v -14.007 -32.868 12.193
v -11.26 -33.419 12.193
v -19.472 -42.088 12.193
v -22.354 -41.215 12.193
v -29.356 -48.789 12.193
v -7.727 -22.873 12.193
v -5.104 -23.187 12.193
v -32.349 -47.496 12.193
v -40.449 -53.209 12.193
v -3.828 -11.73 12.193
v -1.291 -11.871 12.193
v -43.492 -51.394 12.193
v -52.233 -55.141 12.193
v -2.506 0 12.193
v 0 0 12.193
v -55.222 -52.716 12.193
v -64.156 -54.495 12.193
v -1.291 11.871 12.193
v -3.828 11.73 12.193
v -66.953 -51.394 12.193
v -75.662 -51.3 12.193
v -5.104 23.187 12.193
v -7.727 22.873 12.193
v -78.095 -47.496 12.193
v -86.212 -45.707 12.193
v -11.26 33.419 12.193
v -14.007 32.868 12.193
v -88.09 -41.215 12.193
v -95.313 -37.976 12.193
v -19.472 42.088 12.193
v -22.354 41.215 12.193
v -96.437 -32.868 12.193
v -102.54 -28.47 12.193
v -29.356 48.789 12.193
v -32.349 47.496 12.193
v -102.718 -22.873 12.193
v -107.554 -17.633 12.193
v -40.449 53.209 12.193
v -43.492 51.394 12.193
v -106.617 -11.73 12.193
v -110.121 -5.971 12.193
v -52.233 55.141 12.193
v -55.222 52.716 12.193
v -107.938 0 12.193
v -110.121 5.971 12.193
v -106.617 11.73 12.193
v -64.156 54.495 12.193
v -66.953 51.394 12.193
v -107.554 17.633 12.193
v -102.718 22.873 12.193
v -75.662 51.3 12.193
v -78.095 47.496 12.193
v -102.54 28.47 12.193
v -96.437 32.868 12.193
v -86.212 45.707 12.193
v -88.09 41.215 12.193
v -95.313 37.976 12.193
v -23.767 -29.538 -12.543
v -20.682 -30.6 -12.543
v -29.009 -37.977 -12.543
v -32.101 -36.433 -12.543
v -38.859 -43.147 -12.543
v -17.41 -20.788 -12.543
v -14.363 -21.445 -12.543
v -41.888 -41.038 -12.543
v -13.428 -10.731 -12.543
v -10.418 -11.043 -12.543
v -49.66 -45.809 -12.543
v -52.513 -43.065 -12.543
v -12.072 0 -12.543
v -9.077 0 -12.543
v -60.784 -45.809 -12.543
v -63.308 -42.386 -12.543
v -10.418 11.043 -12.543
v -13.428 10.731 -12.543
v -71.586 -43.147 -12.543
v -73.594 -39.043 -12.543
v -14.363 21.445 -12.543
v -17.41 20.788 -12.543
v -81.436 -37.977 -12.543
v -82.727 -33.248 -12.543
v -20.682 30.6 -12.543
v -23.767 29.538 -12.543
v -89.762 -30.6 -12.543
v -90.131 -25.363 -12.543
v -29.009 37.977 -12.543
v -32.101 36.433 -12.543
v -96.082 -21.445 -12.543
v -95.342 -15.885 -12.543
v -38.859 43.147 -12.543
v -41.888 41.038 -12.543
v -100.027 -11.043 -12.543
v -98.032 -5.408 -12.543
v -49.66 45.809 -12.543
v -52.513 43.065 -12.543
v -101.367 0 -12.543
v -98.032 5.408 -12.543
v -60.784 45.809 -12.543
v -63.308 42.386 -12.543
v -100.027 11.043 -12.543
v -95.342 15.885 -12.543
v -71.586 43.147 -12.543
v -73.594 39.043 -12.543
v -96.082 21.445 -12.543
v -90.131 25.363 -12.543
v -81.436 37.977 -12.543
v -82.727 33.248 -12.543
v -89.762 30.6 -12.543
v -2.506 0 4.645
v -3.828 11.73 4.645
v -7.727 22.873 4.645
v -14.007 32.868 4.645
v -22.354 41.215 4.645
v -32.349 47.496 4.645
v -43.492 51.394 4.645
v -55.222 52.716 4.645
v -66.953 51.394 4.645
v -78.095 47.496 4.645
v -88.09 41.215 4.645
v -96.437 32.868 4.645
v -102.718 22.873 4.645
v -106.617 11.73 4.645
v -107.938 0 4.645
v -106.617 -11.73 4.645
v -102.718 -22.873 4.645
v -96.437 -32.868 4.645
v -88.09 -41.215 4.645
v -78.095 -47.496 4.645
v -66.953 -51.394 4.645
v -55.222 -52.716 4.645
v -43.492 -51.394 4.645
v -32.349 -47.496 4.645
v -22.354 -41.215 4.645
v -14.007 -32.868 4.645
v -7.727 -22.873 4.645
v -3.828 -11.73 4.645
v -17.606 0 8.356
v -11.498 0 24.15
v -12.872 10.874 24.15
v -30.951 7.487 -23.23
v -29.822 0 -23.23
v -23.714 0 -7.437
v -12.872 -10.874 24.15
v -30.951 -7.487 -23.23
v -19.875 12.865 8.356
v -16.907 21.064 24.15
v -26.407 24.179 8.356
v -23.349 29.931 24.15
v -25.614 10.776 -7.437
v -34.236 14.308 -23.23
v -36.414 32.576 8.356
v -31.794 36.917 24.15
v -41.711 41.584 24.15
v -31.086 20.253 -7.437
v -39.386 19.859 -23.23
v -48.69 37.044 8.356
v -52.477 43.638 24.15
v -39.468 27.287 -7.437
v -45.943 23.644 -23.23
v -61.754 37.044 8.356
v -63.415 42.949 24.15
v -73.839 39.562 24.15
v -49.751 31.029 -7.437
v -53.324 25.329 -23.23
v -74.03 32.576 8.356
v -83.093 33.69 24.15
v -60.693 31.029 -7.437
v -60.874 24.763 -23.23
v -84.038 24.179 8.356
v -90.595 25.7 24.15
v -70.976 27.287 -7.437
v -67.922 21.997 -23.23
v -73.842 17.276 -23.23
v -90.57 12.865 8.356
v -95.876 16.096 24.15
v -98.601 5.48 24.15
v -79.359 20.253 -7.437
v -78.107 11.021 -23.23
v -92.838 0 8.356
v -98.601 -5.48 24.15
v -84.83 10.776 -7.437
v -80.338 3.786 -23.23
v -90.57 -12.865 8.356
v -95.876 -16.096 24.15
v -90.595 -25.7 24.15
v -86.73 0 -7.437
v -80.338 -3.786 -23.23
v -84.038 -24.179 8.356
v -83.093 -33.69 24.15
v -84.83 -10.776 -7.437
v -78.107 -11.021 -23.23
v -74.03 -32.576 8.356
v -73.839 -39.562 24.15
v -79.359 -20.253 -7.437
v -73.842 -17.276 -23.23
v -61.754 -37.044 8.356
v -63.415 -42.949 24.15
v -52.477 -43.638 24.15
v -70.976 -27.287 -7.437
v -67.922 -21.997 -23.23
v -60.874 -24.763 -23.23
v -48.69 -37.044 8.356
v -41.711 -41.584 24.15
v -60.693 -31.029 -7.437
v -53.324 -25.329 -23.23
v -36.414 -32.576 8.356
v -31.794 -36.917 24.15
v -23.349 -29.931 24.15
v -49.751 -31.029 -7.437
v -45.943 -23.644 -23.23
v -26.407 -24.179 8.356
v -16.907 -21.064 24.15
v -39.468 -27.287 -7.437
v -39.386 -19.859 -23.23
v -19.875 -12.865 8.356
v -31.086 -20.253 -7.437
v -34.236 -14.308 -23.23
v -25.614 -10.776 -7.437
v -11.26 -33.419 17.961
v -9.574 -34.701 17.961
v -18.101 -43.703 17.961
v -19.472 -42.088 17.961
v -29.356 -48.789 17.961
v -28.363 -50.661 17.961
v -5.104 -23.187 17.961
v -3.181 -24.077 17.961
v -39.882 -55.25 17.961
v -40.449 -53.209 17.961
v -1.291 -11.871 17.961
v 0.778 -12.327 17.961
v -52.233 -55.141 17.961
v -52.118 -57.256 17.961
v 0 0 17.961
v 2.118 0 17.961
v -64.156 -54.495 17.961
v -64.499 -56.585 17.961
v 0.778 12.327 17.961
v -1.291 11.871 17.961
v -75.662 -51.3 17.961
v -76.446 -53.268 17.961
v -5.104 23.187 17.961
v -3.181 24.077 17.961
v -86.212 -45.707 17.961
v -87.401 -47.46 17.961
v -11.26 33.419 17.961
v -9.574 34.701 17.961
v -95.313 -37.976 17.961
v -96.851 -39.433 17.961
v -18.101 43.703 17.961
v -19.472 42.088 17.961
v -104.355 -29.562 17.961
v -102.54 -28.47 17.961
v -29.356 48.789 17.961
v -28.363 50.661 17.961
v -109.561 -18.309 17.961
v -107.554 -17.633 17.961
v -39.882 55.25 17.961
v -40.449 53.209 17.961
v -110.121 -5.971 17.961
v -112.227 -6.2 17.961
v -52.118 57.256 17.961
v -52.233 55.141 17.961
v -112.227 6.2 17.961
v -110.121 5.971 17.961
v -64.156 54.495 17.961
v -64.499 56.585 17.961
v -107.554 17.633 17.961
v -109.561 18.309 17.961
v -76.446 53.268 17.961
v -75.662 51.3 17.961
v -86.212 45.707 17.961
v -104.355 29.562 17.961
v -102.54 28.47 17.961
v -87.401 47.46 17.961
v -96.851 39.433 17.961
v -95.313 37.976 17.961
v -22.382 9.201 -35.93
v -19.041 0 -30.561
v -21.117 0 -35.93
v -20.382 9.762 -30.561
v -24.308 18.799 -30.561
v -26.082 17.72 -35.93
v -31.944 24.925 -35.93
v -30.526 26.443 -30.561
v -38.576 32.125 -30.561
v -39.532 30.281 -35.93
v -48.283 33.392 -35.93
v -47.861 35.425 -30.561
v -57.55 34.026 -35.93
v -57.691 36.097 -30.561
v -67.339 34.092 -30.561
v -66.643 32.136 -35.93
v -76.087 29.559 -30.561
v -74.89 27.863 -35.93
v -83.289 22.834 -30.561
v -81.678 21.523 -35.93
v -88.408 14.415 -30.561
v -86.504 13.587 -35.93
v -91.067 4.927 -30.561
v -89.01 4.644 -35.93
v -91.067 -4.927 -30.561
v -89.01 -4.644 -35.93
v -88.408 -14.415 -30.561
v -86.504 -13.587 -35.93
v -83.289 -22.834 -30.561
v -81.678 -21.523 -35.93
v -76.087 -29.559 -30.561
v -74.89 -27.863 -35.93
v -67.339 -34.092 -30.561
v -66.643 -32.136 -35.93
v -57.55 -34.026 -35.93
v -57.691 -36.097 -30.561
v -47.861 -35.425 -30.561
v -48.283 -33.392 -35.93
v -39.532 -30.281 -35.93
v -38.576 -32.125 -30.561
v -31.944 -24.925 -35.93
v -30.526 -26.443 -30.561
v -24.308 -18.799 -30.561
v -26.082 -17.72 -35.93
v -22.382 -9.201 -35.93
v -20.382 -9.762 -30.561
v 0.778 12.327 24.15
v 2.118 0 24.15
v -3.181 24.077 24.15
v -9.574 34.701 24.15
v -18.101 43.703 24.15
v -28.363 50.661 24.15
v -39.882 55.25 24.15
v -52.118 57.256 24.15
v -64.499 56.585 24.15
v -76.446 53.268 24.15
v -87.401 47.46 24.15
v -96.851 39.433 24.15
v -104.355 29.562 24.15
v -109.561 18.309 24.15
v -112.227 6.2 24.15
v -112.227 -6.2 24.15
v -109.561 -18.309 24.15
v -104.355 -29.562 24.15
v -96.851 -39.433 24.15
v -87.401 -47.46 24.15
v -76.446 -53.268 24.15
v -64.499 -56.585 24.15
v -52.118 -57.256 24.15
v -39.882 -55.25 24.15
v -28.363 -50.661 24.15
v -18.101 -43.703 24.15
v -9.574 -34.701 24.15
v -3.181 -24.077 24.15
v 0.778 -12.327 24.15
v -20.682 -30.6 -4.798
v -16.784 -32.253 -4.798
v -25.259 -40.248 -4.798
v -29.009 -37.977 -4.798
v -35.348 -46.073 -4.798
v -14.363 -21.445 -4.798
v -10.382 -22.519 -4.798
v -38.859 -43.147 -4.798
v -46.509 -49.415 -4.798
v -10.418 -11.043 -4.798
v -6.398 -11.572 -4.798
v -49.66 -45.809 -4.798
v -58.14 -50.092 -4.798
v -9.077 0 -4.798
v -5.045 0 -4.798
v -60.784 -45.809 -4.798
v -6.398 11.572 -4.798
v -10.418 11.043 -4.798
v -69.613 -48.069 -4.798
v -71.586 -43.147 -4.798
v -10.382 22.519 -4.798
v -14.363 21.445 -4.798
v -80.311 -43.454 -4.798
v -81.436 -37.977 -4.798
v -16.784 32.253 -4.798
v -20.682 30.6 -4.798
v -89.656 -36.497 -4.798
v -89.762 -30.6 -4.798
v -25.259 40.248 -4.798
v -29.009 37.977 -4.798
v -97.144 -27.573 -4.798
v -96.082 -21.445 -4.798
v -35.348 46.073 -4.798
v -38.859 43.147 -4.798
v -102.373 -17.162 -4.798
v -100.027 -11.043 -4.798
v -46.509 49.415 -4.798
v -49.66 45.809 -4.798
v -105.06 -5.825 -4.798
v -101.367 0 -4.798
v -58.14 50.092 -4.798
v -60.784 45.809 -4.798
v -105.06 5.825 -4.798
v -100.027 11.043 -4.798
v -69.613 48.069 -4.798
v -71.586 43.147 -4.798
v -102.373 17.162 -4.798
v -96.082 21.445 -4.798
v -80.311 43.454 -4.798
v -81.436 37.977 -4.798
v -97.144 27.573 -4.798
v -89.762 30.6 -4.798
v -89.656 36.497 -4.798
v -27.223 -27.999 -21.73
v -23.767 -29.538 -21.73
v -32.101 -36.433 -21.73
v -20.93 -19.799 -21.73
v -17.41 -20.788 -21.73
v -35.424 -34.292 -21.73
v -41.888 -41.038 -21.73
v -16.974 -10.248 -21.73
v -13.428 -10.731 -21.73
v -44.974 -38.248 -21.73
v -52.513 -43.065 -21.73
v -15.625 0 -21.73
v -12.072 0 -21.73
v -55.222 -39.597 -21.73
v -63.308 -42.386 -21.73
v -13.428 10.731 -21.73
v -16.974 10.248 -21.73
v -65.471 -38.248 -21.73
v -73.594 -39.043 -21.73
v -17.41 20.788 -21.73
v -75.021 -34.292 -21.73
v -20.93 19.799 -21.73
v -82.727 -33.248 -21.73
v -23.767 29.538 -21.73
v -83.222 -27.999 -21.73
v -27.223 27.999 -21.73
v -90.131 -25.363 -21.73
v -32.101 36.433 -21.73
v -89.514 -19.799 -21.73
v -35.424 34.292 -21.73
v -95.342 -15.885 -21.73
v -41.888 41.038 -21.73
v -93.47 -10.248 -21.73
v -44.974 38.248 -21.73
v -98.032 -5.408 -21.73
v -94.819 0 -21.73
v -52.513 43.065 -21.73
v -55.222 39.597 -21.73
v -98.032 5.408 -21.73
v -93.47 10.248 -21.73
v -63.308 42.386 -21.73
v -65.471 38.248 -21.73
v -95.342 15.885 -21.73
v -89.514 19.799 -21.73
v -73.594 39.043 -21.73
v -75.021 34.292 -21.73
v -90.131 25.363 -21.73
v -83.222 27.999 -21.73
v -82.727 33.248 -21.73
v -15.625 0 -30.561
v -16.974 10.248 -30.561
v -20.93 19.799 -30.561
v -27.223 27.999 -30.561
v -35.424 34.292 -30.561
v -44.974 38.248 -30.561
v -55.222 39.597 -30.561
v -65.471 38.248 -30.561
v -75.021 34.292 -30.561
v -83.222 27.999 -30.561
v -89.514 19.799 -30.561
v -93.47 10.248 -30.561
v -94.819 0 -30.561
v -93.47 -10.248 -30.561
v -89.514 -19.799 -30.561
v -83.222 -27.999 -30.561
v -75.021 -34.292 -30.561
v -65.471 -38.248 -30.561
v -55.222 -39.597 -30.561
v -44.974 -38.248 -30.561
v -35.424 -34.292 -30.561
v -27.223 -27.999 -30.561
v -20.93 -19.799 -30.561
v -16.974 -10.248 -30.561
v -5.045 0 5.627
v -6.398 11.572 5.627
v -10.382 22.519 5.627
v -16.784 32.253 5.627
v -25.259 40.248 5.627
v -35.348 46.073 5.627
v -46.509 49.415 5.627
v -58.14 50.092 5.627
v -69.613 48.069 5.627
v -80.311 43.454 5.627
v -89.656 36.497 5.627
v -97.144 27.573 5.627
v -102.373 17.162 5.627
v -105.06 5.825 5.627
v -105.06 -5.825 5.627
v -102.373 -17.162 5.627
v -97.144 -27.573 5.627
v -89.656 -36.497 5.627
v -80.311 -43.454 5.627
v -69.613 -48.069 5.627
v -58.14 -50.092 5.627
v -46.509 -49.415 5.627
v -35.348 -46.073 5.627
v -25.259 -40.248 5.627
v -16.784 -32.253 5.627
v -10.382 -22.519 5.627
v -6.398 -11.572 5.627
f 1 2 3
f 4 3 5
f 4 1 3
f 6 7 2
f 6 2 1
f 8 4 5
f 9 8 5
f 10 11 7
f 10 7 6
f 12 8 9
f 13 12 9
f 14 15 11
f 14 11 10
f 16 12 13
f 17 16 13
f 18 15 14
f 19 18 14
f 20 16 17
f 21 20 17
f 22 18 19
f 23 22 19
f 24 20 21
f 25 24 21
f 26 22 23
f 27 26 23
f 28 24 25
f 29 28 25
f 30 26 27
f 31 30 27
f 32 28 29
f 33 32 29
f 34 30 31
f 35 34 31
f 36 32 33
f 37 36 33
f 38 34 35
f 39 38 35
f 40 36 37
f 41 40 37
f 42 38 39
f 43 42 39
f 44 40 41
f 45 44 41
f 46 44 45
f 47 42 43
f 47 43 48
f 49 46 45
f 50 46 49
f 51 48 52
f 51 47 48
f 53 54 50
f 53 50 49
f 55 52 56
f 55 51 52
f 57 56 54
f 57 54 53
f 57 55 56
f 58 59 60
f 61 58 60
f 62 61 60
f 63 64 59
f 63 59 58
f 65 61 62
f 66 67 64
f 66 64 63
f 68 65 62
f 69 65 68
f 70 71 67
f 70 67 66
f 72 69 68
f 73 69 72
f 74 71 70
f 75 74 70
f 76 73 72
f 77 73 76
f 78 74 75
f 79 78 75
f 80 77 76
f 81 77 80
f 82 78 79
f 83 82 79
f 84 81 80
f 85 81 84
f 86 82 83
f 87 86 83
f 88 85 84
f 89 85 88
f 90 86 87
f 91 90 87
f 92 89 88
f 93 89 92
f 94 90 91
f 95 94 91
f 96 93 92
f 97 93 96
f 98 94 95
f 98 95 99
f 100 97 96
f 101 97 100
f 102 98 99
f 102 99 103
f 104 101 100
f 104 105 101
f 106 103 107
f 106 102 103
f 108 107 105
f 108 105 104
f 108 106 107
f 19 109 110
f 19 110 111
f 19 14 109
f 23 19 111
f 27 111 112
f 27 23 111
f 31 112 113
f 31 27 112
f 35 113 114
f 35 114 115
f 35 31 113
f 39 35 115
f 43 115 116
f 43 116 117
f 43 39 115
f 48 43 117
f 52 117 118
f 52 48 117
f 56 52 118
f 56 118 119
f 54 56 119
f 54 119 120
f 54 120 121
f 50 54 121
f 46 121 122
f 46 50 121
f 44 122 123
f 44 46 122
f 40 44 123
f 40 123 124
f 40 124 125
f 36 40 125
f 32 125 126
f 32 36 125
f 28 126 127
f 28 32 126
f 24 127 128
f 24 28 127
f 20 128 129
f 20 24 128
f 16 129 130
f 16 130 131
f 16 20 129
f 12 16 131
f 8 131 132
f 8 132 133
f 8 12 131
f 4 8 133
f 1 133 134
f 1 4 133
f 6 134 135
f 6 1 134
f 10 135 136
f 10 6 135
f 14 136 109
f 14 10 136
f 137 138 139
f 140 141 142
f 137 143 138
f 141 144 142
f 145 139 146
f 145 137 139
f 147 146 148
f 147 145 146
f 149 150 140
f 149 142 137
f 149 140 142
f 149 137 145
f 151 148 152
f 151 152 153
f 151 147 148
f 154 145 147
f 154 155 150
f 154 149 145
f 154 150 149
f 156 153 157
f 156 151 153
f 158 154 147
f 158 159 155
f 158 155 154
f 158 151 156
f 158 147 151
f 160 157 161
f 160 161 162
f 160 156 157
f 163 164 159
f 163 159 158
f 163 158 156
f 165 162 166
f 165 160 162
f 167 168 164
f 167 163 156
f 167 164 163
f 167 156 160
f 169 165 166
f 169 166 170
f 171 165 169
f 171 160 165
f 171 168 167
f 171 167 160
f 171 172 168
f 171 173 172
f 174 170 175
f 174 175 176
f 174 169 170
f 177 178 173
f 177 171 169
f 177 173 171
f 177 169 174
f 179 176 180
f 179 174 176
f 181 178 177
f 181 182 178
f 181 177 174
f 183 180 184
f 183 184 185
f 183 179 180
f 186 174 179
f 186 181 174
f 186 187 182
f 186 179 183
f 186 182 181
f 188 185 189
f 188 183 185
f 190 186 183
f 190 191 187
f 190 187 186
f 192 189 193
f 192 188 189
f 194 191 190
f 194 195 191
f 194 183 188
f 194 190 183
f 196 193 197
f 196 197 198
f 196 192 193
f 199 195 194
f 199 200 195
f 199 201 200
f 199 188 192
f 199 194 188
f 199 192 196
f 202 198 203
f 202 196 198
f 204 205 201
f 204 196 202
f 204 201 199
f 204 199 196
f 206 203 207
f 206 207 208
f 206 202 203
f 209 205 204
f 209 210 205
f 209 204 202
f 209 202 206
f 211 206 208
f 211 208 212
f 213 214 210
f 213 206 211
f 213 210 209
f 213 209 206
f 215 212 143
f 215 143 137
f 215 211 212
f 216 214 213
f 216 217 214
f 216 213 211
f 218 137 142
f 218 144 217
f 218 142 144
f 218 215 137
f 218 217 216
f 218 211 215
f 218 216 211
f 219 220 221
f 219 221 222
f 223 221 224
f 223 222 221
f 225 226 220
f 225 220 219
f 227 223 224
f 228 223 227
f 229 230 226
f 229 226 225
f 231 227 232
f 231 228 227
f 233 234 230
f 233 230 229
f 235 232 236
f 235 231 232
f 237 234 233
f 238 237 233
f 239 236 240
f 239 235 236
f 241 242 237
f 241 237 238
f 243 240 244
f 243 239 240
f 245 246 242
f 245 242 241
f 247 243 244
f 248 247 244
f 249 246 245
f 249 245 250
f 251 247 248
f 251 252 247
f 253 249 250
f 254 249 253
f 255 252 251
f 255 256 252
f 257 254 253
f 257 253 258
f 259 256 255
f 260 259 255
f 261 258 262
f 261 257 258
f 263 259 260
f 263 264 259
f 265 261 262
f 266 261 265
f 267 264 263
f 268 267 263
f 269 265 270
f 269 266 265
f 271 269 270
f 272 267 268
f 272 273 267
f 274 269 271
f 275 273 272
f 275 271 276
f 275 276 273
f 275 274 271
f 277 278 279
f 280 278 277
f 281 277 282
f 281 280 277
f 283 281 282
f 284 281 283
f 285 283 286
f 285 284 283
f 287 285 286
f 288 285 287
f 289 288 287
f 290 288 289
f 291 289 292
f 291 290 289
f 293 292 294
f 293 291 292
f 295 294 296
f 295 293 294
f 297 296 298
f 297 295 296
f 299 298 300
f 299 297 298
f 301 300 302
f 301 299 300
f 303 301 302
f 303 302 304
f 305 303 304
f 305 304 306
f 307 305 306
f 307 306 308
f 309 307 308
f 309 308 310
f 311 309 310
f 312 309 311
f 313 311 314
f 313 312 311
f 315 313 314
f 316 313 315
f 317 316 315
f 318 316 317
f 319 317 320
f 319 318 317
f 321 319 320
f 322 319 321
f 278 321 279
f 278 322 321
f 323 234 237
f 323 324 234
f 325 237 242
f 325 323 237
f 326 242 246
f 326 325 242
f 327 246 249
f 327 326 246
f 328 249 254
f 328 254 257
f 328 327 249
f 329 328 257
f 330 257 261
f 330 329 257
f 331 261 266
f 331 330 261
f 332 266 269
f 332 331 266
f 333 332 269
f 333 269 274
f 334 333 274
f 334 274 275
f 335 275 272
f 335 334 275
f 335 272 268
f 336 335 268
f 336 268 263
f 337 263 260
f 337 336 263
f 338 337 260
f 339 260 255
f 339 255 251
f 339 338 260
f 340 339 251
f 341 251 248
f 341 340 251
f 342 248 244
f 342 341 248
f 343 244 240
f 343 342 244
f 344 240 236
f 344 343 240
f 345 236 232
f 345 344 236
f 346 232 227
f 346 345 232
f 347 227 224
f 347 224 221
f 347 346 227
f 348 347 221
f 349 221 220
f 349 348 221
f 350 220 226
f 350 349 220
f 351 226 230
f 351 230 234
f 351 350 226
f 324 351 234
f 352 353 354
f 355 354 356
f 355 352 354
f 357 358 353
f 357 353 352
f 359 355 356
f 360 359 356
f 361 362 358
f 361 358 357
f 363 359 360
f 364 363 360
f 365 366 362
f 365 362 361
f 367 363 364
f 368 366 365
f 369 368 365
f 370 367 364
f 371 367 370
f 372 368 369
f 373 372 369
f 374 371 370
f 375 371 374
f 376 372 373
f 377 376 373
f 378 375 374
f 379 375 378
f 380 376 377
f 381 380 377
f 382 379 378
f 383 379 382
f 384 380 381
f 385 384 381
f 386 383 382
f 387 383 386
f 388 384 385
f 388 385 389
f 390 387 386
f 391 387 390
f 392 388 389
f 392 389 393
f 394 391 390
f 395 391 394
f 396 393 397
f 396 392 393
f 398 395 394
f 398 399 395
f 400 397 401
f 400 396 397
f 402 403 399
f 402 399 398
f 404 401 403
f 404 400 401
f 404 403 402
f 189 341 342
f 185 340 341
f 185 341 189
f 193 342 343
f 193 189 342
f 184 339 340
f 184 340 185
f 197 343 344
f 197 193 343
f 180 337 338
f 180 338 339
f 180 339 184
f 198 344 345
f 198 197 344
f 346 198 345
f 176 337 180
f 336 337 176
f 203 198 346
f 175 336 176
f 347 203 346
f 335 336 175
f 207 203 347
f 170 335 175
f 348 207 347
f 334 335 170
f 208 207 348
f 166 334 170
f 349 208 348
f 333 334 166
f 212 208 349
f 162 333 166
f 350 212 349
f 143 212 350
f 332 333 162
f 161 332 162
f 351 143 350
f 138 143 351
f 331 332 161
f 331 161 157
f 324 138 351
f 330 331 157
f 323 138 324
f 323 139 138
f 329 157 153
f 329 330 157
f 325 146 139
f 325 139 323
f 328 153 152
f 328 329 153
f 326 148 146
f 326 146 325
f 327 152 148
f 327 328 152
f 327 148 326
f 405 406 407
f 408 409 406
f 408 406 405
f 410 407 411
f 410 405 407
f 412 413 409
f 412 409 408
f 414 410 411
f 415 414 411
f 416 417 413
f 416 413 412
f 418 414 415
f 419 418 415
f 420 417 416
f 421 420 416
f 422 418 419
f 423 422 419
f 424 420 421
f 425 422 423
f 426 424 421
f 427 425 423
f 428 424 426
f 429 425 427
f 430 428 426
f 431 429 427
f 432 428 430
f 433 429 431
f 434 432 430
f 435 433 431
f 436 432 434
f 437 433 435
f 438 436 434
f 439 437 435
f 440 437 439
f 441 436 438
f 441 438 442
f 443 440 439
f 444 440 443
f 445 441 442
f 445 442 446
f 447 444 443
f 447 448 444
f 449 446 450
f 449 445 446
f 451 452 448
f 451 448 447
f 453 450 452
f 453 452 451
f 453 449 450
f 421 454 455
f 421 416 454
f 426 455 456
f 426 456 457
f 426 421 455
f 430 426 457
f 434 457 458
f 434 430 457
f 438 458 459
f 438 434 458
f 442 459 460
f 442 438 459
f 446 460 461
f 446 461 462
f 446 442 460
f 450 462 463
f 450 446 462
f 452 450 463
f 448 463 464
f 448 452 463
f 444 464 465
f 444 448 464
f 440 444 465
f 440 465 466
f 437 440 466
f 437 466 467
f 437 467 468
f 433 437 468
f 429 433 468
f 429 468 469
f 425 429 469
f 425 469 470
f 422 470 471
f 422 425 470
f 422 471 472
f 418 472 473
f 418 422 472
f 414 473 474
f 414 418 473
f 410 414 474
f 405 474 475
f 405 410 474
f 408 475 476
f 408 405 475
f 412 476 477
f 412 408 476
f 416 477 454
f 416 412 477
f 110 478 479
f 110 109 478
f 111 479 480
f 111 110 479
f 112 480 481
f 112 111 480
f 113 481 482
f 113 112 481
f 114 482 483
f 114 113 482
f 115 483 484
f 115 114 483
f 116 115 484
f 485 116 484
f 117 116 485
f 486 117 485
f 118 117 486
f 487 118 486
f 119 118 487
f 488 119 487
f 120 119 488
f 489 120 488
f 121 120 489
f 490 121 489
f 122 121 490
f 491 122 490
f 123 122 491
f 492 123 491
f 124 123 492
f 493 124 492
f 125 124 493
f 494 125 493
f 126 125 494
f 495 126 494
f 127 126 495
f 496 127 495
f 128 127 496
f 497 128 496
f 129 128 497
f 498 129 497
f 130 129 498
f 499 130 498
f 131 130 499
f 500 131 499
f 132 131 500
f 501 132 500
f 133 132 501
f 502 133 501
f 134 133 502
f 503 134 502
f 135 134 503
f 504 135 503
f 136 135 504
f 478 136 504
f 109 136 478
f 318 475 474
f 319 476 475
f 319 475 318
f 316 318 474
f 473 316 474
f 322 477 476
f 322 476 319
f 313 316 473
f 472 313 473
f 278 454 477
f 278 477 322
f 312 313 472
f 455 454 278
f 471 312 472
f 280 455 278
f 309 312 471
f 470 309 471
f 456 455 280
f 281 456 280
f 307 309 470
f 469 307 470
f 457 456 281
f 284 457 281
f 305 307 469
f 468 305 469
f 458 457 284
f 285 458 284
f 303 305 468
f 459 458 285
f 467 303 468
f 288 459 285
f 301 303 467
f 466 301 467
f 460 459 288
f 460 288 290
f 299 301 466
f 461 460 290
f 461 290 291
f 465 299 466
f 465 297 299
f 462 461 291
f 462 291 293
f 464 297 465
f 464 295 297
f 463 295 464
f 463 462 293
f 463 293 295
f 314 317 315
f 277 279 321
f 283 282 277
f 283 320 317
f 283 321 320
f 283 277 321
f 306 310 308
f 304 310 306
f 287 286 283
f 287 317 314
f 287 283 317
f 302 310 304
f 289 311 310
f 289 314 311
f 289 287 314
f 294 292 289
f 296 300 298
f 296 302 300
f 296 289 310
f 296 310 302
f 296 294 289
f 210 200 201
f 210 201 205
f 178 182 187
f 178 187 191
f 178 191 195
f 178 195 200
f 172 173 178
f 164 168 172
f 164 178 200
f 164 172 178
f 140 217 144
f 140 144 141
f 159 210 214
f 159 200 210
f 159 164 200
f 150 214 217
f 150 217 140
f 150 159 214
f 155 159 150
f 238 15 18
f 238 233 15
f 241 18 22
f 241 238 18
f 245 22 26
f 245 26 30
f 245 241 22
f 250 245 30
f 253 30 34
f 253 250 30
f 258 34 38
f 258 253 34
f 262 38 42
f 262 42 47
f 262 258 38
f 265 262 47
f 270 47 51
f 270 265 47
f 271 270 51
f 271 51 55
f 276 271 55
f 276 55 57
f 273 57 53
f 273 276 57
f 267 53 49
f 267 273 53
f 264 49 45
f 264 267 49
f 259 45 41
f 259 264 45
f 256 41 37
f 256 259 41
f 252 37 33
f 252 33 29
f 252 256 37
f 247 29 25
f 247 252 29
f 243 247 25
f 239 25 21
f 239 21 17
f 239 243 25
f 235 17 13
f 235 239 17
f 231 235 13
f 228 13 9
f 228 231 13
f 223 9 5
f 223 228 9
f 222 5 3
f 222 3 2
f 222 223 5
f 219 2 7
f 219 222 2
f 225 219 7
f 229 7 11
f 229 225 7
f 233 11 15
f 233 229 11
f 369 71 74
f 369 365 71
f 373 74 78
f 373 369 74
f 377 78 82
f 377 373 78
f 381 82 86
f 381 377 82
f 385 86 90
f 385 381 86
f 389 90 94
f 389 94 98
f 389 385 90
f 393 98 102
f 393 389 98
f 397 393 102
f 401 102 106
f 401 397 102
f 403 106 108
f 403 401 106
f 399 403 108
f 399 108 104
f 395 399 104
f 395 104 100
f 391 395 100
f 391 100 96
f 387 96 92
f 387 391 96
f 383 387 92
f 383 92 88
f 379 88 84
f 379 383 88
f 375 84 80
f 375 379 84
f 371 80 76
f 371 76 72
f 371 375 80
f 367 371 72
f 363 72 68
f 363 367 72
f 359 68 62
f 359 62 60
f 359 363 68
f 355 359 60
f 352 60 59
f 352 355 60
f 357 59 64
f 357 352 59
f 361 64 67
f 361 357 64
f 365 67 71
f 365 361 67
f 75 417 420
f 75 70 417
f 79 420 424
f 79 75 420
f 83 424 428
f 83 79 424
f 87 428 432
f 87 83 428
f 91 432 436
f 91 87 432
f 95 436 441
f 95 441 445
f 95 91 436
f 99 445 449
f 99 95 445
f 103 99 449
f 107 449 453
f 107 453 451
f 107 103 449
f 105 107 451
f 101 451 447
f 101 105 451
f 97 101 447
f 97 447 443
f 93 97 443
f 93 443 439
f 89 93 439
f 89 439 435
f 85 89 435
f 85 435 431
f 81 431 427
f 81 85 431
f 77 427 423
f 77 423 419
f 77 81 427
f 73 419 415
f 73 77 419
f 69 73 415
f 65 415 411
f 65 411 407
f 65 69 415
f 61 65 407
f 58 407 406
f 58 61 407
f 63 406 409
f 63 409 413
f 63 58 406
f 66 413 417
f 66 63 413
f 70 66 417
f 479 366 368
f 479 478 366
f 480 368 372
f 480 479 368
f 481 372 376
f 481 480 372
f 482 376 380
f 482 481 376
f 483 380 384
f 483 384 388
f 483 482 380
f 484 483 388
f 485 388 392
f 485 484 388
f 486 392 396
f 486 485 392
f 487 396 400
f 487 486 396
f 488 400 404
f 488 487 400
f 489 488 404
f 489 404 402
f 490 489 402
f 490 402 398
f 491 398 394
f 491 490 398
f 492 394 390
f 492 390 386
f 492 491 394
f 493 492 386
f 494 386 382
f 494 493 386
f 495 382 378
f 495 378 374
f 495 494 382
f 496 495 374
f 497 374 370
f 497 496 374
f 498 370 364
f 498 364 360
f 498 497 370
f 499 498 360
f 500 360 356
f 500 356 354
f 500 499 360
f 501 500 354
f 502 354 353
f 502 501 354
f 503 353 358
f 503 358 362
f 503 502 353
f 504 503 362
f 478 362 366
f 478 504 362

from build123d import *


with BuildPart() as f1:
    # F0 (on Front) → F1 (revolve)
    with BuildSketch(Plane.XZ):
        Polygon((-29.822183, -23.230489), (-55.222183, -23.230489), (-55.222183, -35.930488), (-21.117112, -35.930488), (-19.040657, -30.561369), (-15.62502, -21.72951), (-12.072363, -12.543354), (-9.076869, -4.797863), (-5.045252, 5.626746), (-2.506006, 12.19251), (2.118304, 24.149653), (-11.49837, 24.149653), align=None)
        Polygon((2.118304, 17.961016), (2.118304, 24.149653), (-2.506006, 12.19251), (0, 12.19251), (0, 17.961016), align=None)
        Polygon((-15.62502, -21.72951), (-19.040657, -30.561369), (-15.62502, -30.561369), align=None)
        Polygon((-2.506006, 4.644717), (-2.506006, 12.19251), (-5.045252, 5.626746), align=None)
        Polygon((-12.072363, -12.543354), (-15.62502, -21.72951), (-12.072363, -21.72951), align=None)
        Polygon((-5.045252, -4.797863), (-5.045252, 5.626746), (-9.076869, -4.797863), align=None)
        Polygon((-9.076869, -4.797863), (-12.072363, -12.543354), (-9.076869, -12.543354), align=None)
    revolve(axis=Axis((-55.222183, 0, -5.890418), (0, 0, 1)))


solid = f1.part
